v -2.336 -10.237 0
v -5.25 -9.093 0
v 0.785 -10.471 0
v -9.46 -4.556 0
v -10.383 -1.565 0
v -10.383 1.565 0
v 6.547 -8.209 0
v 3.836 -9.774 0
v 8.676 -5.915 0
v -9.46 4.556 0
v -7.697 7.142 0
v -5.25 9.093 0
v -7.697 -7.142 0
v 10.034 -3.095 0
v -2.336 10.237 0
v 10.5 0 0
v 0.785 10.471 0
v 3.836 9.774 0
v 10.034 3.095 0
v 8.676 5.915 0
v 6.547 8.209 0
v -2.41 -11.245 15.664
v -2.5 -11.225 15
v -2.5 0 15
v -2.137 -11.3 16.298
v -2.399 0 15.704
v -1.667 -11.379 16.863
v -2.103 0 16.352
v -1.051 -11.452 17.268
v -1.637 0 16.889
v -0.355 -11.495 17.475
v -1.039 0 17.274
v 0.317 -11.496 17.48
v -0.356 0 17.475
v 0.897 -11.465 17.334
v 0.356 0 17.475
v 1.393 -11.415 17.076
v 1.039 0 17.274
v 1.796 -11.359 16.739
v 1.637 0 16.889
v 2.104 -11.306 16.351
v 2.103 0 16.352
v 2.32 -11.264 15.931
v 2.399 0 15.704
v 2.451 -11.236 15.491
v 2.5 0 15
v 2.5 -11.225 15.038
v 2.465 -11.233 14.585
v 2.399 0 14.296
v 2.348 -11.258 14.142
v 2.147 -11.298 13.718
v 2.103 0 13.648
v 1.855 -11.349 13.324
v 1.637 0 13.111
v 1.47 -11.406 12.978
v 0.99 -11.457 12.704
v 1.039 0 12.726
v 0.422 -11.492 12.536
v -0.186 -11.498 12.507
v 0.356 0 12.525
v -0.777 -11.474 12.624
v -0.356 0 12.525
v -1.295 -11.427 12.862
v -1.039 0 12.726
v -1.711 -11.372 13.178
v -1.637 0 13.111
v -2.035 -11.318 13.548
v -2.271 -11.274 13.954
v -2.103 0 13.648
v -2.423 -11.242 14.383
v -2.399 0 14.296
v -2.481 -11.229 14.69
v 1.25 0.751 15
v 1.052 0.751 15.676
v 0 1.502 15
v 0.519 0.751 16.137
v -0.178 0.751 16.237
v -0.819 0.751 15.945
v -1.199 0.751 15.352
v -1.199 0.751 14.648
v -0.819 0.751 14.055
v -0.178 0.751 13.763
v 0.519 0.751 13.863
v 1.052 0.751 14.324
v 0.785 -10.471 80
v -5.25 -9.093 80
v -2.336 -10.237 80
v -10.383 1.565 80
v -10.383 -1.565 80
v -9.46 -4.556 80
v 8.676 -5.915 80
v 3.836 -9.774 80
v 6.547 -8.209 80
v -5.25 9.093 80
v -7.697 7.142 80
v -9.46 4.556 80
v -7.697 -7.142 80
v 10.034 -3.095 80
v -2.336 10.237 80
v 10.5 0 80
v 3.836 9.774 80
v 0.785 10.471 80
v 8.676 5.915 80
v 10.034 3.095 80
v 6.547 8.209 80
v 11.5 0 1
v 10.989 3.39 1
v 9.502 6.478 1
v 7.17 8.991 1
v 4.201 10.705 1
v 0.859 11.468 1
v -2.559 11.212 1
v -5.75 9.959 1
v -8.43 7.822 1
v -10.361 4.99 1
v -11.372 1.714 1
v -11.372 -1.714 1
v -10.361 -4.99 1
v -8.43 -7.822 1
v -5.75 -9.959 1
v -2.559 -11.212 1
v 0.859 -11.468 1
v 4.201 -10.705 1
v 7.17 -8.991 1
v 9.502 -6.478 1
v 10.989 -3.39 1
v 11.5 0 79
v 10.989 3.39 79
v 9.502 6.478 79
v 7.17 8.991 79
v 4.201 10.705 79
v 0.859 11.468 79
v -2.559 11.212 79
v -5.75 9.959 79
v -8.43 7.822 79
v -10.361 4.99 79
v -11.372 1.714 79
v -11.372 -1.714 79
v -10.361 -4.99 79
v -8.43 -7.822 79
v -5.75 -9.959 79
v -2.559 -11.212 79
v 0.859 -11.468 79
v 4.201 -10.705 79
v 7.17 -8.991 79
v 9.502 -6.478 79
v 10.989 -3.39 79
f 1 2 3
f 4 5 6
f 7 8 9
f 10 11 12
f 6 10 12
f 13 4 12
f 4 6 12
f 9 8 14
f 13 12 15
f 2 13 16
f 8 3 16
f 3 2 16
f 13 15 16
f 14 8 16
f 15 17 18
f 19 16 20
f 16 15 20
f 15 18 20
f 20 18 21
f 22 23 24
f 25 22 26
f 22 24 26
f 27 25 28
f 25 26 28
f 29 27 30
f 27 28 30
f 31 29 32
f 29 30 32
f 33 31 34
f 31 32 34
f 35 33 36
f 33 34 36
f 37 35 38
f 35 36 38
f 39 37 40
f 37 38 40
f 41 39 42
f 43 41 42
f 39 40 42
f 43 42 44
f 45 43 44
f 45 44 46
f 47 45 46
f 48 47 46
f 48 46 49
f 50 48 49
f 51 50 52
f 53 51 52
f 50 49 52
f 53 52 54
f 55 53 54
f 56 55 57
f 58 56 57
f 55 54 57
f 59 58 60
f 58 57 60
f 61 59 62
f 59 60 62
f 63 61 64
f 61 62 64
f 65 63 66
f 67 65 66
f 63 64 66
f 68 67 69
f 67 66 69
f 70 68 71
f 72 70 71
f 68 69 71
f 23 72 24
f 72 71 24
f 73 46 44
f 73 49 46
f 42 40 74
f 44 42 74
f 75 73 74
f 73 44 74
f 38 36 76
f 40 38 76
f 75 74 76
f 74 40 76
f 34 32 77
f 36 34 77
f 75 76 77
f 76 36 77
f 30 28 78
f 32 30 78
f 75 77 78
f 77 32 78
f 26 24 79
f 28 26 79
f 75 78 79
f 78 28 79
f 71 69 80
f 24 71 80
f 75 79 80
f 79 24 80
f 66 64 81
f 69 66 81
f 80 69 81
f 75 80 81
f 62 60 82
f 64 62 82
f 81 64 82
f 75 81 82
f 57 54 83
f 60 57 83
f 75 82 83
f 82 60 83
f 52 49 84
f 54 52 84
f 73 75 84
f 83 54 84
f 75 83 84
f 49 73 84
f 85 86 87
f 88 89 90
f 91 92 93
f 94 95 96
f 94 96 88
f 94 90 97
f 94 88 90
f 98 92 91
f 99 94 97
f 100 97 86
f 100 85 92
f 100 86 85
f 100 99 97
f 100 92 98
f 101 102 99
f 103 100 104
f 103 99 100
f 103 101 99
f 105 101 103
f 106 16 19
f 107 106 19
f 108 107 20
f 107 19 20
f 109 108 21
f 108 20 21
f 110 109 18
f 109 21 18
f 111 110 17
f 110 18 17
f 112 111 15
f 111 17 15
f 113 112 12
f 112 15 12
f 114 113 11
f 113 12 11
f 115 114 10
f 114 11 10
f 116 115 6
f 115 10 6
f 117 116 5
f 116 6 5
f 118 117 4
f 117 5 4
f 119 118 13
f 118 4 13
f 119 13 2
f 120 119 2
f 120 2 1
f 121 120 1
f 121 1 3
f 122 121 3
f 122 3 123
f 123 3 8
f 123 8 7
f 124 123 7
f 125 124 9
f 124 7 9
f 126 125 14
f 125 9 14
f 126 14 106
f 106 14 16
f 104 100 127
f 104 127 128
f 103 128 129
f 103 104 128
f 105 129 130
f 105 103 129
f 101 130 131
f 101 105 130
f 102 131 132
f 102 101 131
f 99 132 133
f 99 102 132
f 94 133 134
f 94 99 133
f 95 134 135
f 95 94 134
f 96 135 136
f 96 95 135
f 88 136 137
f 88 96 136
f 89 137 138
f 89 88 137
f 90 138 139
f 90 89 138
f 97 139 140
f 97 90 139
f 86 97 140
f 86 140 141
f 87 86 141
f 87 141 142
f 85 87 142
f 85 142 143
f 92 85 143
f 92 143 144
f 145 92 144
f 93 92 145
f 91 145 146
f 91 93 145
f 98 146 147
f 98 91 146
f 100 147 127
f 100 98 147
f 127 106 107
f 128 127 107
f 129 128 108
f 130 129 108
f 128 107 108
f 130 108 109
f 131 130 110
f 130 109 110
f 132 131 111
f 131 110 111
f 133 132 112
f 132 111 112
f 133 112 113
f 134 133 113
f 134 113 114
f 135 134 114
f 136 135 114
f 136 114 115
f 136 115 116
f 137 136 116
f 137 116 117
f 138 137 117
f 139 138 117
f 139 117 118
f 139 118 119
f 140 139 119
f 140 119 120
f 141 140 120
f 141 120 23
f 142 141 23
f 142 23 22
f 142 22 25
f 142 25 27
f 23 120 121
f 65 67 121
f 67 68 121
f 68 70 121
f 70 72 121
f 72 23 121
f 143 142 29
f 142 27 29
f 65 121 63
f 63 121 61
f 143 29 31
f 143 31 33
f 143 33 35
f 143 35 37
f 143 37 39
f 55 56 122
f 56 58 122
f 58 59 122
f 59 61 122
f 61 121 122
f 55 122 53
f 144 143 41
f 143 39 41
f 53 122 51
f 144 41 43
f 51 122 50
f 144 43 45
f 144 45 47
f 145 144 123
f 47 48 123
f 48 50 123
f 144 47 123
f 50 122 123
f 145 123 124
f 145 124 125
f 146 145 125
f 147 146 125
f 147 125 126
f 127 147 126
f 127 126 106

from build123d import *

# Parameters (mm, degrees)
SKETCH2_R                 = 11.5
BOSS_EXTRUDE1_DEPTH       = 80
CHAMFER1_SIZE             = 1
M6X1_0_TAPPED_HOLE1_D     = 5
M6X1_0_TAPPED_HOLE1_DEPTH = 11.5
M6X1_0_TAPPED_HOLE1_TIP   = 1.502151548


with BuildPart() as part:
    # Sketch2 → Boss-Extrude1 (new body)
    with BuildSketch(Plane.XY):
        Circle(SKETCH2_R)
    extrude(amount=BOSS_EXTRUDE1_DEPTH)

    # Chamfer1
    chamfer1_edges = [part.edges().sort_by_distance(p)[0] for p in [
        (-11.5, 0, 0),
        (-11.5, 0, 80),
    ]]
    chamfer(chamfer1_edges, length=CHAMFER1_SIZE)

    # M6x1.0 Tapped Hole1
    with Locations(Plane.XZ.offset(11.5)):
        with Locations((0, 15)):
            Hole(M6X1_0_TAPPED_HOLE1_D / 2, depth=M6X1_0_TAPPED_HOLE1_DEPTH)
            with Locations((0, 0, -(M6X1_0_TAPPED_HOLE1_DEPTH + M6X1_0_TAPPED_HOLE1_TIP / 2))):  # 118° drill point
                Cone(0, M6X1_0_TAPPED_HOLE1_D / 2, M6X1_0_TAPPED_HOLE1_TIP, mode=Mode.SUBTRACT)


solid = part.part
